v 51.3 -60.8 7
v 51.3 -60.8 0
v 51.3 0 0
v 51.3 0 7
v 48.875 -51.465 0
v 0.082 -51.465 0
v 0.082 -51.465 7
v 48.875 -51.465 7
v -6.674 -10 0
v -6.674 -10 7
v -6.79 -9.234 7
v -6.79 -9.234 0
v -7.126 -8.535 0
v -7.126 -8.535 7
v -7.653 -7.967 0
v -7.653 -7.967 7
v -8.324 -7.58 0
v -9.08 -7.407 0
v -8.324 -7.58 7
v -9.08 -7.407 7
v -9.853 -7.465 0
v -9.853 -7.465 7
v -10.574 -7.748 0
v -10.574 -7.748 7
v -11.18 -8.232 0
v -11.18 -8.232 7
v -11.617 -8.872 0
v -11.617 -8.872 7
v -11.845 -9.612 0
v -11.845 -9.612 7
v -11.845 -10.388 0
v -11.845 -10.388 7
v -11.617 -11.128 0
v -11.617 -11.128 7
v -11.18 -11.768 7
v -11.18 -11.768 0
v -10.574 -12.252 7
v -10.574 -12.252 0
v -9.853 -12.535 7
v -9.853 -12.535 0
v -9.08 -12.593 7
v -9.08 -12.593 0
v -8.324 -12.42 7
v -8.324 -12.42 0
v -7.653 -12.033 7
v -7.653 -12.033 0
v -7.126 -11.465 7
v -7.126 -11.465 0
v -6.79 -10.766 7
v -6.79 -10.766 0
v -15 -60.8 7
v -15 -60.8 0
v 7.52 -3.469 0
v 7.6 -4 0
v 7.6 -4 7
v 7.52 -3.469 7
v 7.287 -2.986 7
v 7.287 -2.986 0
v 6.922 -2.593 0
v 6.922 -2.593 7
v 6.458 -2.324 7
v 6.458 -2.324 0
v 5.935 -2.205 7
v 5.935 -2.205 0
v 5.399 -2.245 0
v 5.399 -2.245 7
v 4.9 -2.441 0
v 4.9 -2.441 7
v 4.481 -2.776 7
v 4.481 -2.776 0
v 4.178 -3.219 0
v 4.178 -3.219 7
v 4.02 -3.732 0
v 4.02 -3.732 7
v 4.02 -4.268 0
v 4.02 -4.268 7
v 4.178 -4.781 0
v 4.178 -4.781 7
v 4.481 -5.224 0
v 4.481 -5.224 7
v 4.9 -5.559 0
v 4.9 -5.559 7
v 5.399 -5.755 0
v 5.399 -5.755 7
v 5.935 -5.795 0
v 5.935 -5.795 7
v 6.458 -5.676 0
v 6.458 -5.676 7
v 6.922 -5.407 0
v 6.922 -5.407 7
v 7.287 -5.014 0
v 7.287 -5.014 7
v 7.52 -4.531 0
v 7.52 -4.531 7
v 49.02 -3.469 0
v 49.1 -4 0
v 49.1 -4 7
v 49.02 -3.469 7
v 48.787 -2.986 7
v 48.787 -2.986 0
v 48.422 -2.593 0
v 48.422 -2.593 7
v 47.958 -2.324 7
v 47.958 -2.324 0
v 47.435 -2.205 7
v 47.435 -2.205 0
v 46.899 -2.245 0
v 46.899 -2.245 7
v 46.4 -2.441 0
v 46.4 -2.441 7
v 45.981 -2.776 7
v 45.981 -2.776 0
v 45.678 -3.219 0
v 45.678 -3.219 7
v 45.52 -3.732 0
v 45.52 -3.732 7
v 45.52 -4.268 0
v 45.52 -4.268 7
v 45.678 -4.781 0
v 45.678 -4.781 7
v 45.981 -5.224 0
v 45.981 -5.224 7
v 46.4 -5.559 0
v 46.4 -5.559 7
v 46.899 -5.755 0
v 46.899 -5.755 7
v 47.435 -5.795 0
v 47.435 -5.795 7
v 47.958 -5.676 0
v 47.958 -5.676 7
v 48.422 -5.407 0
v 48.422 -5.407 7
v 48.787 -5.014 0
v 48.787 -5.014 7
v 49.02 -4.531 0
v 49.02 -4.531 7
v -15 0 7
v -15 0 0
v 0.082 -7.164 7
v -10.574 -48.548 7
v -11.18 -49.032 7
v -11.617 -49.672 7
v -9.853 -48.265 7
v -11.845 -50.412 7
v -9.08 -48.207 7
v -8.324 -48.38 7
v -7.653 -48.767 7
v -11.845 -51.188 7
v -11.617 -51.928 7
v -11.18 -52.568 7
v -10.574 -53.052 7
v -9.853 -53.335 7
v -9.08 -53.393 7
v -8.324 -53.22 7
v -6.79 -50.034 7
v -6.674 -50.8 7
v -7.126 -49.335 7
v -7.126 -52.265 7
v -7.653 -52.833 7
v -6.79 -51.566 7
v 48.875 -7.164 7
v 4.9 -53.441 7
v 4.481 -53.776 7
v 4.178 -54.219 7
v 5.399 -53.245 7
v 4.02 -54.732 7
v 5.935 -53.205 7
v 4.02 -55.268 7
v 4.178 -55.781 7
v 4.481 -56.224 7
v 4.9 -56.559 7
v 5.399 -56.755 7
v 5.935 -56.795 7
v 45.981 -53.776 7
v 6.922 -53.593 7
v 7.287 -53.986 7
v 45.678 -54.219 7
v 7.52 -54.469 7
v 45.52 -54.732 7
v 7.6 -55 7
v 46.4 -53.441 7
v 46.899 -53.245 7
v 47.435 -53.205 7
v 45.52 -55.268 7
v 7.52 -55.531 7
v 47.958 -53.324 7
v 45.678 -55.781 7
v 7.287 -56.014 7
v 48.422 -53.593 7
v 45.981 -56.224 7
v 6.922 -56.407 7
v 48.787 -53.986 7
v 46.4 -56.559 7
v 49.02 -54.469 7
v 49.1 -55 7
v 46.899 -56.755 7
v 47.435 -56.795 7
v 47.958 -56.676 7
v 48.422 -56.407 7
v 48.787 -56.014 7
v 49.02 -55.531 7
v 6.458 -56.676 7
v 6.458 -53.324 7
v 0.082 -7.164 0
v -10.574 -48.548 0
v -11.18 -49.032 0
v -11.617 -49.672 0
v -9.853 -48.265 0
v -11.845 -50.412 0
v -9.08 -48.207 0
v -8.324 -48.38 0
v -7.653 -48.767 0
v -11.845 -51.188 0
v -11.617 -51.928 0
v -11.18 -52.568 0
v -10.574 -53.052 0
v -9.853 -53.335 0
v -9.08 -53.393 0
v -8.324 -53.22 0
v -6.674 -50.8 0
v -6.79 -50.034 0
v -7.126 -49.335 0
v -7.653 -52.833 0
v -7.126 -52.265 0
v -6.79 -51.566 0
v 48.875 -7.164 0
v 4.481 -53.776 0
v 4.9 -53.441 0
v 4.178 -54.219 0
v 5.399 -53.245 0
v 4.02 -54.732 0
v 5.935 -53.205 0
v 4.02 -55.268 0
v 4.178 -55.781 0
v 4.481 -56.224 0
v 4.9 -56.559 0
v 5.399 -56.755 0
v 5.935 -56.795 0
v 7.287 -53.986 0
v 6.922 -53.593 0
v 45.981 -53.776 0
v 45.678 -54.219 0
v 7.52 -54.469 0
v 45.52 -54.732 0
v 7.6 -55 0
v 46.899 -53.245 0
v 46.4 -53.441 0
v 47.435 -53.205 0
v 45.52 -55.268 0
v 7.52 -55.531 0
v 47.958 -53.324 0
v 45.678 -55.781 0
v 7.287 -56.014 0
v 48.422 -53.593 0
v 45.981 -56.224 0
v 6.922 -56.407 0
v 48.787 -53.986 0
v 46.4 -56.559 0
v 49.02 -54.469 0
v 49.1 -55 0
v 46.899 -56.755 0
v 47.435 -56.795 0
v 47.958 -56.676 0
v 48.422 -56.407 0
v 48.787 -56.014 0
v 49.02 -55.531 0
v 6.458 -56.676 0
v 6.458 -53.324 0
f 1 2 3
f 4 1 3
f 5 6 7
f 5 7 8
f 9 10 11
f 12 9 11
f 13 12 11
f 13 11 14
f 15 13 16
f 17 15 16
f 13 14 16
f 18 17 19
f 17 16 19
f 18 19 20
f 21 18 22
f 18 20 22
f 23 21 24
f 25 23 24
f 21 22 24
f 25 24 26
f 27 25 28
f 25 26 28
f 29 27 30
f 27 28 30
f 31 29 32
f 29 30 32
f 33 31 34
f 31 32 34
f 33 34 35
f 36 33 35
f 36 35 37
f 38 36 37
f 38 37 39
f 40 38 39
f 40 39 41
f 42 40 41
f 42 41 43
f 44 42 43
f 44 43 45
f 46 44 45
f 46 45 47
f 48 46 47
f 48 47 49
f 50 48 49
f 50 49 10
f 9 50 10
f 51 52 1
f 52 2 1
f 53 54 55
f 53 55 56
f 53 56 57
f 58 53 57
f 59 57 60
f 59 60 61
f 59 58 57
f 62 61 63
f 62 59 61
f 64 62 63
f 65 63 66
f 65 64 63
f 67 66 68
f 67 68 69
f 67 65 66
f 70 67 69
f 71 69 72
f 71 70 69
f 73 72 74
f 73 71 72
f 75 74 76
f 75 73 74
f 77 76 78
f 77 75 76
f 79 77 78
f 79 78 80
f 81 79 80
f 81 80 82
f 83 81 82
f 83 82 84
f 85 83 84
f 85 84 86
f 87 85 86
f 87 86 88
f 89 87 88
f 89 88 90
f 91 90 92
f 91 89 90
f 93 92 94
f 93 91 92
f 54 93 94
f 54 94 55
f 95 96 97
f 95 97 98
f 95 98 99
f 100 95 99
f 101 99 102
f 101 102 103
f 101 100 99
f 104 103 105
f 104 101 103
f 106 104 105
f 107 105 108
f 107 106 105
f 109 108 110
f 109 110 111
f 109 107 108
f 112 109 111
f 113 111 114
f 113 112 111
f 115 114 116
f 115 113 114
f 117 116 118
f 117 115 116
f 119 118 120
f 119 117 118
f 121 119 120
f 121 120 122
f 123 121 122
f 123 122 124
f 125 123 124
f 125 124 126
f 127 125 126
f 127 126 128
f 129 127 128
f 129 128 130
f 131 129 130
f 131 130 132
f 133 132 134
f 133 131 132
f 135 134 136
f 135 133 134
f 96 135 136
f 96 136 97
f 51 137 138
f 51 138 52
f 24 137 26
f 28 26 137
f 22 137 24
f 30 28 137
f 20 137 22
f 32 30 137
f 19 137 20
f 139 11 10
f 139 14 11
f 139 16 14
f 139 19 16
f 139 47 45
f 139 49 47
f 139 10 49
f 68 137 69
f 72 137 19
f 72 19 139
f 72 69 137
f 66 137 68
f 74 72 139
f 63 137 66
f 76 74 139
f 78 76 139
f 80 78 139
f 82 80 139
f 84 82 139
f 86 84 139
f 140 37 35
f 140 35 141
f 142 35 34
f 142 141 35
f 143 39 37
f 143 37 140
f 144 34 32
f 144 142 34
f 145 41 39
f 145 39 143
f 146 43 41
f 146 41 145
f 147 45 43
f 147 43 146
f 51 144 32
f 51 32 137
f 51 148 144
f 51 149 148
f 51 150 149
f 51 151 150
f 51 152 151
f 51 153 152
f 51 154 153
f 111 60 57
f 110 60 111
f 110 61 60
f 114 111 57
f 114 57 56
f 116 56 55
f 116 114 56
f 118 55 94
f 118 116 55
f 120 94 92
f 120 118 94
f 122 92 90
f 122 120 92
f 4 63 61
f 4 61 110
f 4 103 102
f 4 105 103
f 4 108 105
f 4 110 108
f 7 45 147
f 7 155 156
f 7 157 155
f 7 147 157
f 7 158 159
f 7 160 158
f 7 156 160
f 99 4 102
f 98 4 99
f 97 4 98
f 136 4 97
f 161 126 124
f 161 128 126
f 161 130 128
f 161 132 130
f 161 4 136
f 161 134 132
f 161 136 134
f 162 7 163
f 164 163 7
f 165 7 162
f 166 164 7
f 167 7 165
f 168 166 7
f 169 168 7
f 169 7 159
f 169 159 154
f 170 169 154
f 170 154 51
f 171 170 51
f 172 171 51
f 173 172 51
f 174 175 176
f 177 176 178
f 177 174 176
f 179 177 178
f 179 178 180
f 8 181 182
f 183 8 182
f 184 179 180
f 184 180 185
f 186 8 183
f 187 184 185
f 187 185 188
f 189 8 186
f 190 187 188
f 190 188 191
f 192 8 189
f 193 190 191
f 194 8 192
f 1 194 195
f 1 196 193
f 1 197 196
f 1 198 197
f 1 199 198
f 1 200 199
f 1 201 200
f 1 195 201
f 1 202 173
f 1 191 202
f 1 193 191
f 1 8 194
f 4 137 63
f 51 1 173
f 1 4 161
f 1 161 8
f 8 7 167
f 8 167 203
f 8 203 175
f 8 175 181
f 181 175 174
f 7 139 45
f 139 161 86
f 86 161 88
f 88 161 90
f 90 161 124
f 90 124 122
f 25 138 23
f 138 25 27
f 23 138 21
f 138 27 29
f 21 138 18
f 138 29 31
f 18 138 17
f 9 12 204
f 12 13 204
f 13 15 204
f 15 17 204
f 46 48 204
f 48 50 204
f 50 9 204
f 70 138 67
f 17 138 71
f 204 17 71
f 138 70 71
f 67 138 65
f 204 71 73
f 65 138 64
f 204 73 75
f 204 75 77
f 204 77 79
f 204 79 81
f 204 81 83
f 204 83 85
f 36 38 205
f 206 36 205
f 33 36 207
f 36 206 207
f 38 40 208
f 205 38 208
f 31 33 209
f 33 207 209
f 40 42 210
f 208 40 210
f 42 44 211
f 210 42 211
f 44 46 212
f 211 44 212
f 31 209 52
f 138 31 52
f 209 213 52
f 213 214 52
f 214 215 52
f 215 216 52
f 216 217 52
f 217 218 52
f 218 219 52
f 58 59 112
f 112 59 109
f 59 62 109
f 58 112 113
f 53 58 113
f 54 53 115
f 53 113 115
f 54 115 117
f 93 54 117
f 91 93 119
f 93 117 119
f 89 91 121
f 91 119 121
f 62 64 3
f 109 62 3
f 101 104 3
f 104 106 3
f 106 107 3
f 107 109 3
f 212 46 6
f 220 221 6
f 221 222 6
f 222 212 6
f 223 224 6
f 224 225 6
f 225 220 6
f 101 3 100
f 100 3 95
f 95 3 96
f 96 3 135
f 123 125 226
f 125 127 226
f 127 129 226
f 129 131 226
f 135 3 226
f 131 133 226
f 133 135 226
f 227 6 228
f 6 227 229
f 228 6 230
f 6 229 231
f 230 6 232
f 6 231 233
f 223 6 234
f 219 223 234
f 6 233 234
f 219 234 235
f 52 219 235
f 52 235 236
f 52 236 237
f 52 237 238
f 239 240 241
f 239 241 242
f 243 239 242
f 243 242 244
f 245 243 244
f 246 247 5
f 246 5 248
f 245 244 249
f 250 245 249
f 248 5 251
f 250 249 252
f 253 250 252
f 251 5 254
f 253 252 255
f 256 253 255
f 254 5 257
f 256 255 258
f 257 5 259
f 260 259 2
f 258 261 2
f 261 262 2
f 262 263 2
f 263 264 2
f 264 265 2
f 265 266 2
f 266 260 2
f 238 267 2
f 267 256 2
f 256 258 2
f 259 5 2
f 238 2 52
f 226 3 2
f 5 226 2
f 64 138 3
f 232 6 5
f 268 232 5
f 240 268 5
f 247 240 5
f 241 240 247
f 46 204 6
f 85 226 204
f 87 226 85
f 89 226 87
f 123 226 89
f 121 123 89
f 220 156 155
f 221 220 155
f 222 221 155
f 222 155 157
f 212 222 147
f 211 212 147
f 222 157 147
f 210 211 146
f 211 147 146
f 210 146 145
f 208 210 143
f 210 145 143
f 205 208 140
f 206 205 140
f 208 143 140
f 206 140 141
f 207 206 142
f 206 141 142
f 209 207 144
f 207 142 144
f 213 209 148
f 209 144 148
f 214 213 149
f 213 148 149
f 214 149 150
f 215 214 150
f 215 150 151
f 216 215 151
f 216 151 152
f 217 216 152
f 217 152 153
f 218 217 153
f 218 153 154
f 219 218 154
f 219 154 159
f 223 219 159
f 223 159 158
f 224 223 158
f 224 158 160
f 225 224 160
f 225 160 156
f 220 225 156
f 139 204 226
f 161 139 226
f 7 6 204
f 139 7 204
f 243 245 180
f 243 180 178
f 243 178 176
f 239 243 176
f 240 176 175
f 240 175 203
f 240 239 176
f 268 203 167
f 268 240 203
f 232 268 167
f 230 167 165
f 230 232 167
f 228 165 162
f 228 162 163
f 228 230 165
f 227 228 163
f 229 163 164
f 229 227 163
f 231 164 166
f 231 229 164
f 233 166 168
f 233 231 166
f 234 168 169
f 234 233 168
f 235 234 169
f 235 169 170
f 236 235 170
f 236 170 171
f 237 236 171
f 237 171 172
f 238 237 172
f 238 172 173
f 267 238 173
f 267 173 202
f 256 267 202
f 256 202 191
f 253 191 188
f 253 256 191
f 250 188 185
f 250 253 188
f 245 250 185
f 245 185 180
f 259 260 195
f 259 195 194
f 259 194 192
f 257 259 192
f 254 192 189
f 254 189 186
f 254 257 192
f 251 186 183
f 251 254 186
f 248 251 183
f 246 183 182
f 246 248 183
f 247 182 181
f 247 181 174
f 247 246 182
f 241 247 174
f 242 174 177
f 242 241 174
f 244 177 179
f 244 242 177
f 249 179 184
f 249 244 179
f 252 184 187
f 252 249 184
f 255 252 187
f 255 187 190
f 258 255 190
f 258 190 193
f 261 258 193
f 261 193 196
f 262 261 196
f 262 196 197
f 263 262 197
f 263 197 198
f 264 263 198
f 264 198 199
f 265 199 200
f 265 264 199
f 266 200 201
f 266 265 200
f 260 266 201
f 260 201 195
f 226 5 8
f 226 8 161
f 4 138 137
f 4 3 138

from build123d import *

# Parameters (mm, degrees)
F0_W      = 51.3
F0_H      = 60.8
F0_R      = 1.8
F0_W_2    = 48.792678
F0_H_2    = 44.301098
F1_DEPTH  = 7
F1_FACE_W = 60.8
F1_FACE_H = 7
F2_DEPTH  = 15
F3_R      = 2.6
F4_DEPTH  = 25


with BuildPart() as f1:
    # F0 (on Top) → F1 (new body)
    with BuildSketch(Plane.XY):
        with Locations((25.65, -30.4)):
            Rectangle(F0_W, F0_H)
        with Locations((5.8, -55)):
            Circle(F0_R, mode=Mode.SUBTRACT)
        with Locations((47.3, -55)):
            Circle(F0_R, mode=Mode.SUBTRACT)
        with Locations((24.478404, -29.314266)):
            Rectangle(F0_W_2, F0_H_2, mode=Mode.SUBTRACT)
        with Locations((5.8, -4)):
            Circle(F0_R, mode=Mode.SUBTRACT)
        with Locations((47.3, -4)):
            Circle(F0_R, mode=Mode.SUBTRACT)
    extrude(amount=F1_DEPTH)

    # F1_face (on face) → F2 (join)
    with BuildSketch(Plane(origin=(0, -30.4, 3.5), x_dir=(0, -1, 0), z_dir=(-1, 0, 0))):
        Rectangle(F1_FACE_W, F1_FACE_H)
    extrude(amount=F2_DEPTH)

    # F3 (on face) → F4 (cut)
    with BuildSketch(Plane.XY.offset(7)):
        with Locations((-9.274096, -10)):
            Circle(F3_R)
        with Locations((-9.274096, -50.8)):
            Circle(F3_R)
    extrude(amount=-F4_DEPTH, mode=Mode.SUBTRACT)


solid = f1.part
